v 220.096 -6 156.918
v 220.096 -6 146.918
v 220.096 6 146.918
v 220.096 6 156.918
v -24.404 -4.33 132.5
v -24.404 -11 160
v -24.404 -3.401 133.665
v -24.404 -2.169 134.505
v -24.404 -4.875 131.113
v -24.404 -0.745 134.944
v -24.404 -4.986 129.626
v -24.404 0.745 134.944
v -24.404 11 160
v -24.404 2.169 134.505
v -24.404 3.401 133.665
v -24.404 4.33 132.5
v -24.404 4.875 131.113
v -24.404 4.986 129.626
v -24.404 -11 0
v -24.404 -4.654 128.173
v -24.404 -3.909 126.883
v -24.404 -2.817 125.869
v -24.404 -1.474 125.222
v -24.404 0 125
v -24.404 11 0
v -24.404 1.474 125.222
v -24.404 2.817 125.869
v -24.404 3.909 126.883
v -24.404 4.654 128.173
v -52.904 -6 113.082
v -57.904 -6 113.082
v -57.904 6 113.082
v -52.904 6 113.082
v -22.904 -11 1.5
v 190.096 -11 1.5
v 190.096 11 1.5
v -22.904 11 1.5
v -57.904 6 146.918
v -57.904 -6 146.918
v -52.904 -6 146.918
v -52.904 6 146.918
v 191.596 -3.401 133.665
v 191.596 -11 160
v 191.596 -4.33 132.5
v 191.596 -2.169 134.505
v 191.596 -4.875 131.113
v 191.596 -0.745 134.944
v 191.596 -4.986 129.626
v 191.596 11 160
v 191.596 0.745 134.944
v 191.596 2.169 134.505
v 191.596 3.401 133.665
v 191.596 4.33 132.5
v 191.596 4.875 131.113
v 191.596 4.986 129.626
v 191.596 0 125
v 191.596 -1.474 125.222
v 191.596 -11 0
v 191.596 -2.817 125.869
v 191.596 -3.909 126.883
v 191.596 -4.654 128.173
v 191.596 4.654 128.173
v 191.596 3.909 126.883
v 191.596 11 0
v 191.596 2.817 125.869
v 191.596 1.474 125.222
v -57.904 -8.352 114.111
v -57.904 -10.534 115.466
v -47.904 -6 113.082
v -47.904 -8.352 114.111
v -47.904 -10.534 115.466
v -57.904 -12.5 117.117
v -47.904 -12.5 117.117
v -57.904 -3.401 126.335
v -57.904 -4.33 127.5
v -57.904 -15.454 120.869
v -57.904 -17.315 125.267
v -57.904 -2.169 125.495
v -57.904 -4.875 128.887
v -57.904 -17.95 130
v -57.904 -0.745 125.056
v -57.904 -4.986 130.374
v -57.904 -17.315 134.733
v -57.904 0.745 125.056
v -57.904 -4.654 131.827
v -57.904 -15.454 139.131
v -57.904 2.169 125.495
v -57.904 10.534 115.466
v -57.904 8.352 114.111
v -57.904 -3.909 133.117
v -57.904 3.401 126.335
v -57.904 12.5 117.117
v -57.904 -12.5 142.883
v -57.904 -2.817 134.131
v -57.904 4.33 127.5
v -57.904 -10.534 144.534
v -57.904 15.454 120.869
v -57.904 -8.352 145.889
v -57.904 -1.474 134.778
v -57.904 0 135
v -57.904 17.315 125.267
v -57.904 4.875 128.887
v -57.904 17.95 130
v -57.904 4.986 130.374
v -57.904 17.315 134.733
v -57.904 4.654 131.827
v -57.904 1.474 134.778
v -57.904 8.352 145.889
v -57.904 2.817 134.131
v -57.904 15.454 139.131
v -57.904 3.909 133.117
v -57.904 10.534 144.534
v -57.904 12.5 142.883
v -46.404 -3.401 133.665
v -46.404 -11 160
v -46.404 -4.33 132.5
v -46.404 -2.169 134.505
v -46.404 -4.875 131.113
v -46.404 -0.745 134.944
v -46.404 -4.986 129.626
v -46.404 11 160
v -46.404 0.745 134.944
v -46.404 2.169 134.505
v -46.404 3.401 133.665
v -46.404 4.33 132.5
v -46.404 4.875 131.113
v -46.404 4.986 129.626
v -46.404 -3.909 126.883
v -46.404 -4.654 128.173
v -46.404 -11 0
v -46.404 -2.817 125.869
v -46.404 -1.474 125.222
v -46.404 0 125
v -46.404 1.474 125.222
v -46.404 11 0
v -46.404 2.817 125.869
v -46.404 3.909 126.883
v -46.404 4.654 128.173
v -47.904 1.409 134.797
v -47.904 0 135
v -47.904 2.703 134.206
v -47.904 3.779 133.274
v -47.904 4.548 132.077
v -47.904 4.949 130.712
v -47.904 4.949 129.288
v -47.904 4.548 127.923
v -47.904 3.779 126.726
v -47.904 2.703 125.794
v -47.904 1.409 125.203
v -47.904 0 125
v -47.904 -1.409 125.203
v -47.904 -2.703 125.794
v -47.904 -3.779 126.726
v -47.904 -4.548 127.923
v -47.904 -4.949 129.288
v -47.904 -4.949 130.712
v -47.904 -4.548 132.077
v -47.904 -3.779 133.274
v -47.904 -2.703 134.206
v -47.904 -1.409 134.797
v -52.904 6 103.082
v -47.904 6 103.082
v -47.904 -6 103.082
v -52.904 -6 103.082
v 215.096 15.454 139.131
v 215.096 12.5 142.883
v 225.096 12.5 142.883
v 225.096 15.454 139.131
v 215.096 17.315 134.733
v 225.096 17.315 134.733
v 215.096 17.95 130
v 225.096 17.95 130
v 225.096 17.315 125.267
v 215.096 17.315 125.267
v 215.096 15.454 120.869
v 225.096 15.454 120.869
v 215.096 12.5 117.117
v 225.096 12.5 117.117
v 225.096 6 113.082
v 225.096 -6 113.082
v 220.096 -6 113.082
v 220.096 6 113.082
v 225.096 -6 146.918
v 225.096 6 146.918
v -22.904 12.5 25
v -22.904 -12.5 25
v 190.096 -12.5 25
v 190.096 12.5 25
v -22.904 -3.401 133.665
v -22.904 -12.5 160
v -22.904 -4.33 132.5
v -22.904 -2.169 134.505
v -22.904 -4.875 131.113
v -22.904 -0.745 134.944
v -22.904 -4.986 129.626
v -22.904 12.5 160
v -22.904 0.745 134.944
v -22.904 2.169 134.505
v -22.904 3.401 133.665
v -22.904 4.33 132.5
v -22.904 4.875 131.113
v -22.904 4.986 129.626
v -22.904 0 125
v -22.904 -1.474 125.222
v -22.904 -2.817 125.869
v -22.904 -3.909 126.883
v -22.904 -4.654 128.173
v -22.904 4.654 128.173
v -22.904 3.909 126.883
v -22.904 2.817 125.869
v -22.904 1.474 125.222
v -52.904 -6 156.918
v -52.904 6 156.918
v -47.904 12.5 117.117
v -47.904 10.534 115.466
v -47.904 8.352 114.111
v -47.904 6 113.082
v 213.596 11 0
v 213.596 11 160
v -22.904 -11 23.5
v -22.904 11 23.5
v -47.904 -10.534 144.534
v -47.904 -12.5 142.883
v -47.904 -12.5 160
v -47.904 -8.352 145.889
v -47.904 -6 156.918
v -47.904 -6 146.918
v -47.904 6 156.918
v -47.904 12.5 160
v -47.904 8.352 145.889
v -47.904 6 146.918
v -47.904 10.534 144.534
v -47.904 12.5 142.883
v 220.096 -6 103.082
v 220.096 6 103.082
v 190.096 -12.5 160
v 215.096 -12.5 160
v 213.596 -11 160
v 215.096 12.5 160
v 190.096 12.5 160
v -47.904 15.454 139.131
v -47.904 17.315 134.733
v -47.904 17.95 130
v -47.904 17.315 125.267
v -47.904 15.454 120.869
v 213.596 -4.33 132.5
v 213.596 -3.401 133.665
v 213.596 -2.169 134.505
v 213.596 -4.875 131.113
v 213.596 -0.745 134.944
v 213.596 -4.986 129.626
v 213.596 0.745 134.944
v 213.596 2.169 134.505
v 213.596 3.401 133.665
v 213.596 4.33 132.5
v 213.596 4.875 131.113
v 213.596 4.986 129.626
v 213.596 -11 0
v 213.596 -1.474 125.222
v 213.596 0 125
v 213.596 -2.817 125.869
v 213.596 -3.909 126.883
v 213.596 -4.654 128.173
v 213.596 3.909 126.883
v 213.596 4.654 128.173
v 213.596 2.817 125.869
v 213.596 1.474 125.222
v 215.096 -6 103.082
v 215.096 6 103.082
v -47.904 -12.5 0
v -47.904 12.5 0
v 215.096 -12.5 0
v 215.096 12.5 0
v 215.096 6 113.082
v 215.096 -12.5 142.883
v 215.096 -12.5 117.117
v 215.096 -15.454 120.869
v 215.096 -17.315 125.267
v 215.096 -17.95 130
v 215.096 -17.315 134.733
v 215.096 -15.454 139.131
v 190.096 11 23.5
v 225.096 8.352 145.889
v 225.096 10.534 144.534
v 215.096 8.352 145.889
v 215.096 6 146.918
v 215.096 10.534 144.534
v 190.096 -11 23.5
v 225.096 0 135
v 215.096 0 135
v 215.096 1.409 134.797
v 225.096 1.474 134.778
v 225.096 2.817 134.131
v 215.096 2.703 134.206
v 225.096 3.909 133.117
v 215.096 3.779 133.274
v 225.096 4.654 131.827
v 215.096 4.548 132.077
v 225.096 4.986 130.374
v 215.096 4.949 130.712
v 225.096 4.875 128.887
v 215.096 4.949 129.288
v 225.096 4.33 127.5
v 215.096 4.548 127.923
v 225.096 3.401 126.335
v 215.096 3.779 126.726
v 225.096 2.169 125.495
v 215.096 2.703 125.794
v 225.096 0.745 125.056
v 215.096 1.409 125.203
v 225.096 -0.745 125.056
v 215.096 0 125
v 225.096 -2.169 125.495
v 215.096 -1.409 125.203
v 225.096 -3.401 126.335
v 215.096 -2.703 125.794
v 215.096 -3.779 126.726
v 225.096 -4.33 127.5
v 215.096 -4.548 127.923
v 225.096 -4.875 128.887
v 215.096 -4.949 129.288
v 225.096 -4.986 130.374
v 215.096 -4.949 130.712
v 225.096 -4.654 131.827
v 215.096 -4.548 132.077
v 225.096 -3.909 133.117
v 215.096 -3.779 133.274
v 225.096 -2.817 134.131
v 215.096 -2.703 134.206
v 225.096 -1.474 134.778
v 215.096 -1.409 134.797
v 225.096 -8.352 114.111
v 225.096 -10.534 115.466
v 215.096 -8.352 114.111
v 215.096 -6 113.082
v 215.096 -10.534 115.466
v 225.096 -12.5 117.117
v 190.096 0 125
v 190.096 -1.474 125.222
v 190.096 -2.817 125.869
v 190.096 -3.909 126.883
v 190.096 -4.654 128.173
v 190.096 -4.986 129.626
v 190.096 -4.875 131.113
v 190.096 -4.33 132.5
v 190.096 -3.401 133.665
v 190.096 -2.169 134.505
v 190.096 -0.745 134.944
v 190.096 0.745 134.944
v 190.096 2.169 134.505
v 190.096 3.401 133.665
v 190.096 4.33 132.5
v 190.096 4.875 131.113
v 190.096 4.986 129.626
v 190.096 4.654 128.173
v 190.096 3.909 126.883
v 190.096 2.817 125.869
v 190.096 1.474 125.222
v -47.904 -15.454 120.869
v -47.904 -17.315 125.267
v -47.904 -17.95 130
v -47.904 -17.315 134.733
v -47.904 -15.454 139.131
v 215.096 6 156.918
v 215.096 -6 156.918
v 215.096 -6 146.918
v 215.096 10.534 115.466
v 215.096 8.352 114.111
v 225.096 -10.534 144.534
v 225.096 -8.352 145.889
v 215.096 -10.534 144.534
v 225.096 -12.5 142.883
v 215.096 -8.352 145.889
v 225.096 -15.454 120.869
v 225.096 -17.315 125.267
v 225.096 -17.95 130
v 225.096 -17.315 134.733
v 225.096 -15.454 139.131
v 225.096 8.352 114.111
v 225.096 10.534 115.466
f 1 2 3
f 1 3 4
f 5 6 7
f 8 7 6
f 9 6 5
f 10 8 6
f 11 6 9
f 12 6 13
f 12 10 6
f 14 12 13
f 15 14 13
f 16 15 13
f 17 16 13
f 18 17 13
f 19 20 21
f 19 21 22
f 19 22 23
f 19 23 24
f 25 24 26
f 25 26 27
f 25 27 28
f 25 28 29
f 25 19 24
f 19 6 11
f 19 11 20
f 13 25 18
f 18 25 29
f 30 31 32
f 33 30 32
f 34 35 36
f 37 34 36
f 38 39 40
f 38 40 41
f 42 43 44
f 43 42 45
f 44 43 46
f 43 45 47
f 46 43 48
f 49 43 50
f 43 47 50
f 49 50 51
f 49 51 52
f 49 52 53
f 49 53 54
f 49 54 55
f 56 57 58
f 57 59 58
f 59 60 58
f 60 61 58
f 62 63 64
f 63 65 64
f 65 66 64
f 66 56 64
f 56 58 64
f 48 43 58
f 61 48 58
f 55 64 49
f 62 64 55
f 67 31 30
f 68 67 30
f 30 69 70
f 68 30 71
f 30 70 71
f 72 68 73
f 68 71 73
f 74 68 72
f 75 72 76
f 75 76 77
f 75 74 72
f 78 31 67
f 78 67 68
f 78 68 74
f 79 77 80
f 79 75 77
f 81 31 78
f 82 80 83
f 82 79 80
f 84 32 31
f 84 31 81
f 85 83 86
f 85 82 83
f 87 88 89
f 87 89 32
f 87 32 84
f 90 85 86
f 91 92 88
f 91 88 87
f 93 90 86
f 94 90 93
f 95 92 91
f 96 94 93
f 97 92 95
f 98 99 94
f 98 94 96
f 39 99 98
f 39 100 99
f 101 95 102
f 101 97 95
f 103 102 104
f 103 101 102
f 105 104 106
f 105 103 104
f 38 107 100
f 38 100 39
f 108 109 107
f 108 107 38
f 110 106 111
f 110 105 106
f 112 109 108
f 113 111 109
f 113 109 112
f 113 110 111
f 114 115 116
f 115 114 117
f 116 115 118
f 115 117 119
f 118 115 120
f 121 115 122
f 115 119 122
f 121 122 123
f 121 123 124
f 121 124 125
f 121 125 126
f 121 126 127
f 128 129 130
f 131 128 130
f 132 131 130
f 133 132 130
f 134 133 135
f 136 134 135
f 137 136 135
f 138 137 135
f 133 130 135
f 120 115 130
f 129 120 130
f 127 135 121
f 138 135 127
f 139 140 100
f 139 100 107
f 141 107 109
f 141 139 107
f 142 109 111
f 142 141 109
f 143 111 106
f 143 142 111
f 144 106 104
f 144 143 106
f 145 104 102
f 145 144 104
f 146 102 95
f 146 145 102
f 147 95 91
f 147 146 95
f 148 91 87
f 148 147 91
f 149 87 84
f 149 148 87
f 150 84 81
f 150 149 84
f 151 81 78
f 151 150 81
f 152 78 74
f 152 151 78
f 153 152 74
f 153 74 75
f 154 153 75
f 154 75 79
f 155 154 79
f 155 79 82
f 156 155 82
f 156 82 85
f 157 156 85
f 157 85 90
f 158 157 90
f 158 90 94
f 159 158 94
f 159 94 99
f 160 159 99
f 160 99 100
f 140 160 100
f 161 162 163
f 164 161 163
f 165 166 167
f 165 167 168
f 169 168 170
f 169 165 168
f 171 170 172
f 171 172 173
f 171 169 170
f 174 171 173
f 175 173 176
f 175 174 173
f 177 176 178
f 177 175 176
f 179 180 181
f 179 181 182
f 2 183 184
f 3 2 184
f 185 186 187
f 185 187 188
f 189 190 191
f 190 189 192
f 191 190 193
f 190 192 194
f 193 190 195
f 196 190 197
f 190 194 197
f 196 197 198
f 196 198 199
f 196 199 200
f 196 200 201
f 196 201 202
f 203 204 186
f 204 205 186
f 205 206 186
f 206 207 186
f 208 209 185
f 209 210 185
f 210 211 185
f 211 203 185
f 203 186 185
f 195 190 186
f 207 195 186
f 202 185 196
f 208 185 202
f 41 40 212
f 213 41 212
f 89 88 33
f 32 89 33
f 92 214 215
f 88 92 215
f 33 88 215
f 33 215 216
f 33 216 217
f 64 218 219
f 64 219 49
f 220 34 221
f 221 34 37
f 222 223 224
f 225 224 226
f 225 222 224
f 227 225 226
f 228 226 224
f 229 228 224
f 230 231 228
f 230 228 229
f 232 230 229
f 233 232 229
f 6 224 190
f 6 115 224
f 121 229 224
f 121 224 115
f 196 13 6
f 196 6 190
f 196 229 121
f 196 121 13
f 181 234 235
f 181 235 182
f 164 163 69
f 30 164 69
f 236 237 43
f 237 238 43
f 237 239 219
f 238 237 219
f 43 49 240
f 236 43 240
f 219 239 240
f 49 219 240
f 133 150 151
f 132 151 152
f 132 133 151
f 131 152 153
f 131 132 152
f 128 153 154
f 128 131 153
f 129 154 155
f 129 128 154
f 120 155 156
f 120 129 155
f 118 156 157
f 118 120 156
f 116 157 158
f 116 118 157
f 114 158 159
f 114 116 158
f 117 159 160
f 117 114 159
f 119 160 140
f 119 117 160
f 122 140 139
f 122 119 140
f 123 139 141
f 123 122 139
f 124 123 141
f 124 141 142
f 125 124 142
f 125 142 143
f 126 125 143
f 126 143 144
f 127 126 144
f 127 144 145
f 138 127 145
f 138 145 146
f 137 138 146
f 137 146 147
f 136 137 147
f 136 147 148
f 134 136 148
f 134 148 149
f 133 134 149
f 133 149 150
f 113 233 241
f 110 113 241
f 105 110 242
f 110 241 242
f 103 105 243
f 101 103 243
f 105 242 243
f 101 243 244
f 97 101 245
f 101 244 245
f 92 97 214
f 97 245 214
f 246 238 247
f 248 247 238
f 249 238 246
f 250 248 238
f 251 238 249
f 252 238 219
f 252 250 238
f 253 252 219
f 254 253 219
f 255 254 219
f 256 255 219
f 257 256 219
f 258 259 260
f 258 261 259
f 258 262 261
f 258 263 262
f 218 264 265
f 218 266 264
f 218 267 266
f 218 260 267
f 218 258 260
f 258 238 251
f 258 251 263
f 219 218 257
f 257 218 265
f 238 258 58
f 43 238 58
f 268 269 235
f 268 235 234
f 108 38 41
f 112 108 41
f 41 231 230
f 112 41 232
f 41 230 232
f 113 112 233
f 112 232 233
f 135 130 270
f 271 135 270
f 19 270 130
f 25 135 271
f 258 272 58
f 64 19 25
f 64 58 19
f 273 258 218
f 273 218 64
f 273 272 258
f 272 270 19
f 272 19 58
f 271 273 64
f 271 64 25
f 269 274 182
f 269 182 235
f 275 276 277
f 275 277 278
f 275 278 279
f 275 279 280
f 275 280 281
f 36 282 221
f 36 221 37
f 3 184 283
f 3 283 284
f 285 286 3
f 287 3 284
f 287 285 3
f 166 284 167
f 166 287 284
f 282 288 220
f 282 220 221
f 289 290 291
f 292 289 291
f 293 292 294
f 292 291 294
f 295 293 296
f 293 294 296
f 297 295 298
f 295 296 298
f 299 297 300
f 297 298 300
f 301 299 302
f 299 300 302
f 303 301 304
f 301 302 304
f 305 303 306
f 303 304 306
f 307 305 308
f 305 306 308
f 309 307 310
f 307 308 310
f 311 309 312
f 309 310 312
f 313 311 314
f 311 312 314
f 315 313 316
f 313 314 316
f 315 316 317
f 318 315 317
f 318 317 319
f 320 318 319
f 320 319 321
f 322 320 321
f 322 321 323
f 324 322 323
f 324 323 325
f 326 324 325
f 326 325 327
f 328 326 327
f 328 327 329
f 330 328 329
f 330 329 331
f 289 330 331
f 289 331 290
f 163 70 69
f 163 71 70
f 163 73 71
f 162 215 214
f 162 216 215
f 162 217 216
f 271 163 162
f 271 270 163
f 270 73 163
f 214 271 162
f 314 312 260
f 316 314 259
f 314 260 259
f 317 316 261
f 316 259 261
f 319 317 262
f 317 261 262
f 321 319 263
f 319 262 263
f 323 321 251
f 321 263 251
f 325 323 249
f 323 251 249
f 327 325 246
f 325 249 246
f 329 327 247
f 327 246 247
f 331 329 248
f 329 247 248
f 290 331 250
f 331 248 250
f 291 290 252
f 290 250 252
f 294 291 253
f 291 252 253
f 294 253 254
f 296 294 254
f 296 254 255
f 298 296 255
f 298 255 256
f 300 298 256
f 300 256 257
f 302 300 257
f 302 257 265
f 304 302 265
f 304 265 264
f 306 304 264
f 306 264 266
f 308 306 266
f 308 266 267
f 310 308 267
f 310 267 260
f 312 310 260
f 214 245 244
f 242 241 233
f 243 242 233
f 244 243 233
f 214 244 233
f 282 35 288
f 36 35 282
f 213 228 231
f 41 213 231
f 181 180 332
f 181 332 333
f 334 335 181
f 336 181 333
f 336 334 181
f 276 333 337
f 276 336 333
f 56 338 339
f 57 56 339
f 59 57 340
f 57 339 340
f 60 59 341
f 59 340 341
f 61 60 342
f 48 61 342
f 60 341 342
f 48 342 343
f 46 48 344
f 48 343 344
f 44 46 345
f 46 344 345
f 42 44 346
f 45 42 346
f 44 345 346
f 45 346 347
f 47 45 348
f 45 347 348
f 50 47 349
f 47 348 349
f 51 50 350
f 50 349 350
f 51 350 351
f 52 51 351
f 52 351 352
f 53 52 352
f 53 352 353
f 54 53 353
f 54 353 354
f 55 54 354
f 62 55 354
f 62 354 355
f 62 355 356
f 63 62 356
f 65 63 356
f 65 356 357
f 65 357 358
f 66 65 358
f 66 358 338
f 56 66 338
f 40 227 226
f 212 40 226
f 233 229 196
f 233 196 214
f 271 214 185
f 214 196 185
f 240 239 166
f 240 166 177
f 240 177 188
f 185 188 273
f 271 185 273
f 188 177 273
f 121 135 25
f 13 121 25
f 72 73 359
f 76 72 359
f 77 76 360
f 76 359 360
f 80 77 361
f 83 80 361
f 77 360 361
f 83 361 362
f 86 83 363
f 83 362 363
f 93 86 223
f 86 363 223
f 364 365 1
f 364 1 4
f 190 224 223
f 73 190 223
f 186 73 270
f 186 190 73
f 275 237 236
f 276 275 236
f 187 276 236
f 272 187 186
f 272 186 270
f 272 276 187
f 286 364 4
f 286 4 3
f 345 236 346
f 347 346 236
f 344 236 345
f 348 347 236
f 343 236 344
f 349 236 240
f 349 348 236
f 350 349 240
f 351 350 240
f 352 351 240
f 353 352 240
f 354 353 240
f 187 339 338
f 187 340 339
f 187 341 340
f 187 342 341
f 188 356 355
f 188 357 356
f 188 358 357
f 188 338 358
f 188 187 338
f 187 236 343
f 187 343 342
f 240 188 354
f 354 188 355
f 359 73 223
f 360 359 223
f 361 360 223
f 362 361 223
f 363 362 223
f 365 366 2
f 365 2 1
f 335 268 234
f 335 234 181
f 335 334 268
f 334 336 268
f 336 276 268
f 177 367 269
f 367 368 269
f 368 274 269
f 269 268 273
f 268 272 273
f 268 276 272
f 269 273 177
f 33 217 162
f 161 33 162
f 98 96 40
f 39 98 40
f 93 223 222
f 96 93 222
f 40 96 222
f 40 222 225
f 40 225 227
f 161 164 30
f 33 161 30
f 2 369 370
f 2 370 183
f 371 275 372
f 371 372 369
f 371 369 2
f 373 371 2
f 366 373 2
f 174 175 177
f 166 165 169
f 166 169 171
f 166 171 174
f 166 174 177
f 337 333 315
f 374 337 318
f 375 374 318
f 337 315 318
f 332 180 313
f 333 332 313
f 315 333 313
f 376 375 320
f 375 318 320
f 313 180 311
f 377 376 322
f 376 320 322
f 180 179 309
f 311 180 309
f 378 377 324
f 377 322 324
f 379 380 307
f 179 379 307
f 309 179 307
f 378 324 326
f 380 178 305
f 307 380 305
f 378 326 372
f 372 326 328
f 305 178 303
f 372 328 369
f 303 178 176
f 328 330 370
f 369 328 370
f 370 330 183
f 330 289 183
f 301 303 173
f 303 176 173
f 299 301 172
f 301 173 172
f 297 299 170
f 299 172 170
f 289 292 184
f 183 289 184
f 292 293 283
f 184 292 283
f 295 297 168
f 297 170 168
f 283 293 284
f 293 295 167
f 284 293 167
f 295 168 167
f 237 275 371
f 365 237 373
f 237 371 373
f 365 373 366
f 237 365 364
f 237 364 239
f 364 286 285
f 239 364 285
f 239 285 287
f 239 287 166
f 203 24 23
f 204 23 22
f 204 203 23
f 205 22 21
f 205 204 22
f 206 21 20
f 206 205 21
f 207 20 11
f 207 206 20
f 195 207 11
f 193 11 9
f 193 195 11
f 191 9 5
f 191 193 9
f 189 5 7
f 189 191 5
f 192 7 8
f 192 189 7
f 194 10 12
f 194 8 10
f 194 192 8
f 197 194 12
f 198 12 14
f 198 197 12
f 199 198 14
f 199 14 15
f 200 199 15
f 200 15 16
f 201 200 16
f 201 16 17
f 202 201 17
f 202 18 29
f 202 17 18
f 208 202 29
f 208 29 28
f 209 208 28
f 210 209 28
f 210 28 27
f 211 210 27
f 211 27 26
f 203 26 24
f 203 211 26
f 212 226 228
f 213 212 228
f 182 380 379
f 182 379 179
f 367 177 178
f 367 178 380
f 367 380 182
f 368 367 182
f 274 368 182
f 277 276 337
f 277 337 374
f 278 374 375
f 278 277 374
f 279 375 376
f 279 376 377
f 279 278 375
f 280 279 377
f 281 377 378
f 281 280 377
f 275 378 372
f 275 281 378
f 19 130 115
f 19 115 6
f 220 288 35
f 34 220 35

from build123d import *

# Parameters (mm, degrees)
SKETCH3_W           = 25
SKETCH3_H           = 25
SKETCH3_W_2         = 22
SKETCH3_H_2         = 22
BOSS_EXTRUDE1_DEPTH = 160
SKETCH4_W           = 25
SKETCH4_H           = 25
SKETCH4_W_2         = 22
SKETCH4_H_2         = 22
BOSS_EXTRUDE2_DEPTH = 106.5
SKETCH5_R           = 5
BOSS_EXTRUDE3_DEPTH = 10
SKETCH6_W           = 10
SKETCH6_H           = 12
CUT_EXTRUDE1_DEPTH  = 5
CUT_EXTRUDE2_START  = -25
SKETCH7_R           = 5
CUT_EXTRUDE2_DEPTH  = 25


with BuildPart() as part:
    # Sketch3 → Boss-Extrude1 (new body)
    with BuildSketch(Plane.XY):
        with Locations((-35.404260395, 0)):
            Rectangle(SKETCH3_W, SKETCH3_H)
        with Locations((-35.404260395, 0)):
            Rectangle(SKETCH3_W_2, SKETCH3_H_2, mode=Mode.SUBTRACT)
    boss_extrude1 = extrude(amount=BOSS_EXTRUDE1_DEPTH)

    # Sketch4 → Boss-Extrude2 (add)
    with BuildSketch(Plane(origin=(-22.904260395, 0, 0), x_dir=(0, 0, -1), z_dir=(1, 0, 0))):
        with Locations((-12.5, 0)):
            Rectangle(SKETCH4_W, SKETCH4_H)
        with Locations((-12.5, 0)):
            Rectangle(SKETCH4_W_2, SKETCH4_H_2, mode=Mode.SUBTRACT)
    boss_extrude2 = extrude(amount=BOSS_EXTRUDE2_DEPTH)

    # Sketch5 → Boss-Extrude3 (add)
    # profile 1 of 5: a face of its own
    with BuildSketch(Plane.ZY.offset(47.904260395)):
        with BuildLine():
            ThreePointArc((113.082291583, -6), (112.049822896, 0), (113.082291583, 6))
            Line((113.082291583, 6), (103.082291583, 6))
            Line((103.082291583, 6), (103.082291583, -6))
            Line((103.082291583, -6), (113.082291583, -6))
        make_face()
    # profile 2 of 5: a face of its own
    with BuildSketch(Plane.ZY.offset(47.904260395)):
        with BuildLine():
            ThreePointArc((147.950177104, 0), (147.69017694, 3.044092295), (146.917708417, 6))
            ThreePointArc((146.917708417, 6), (145.250430663, 9.467482384), (142.882502012, 12.5))
            Line((142.882502012, 12.5), (117.117497988, 12.5))
            ThreePointArc((117.117497988, 12.5), (114.749569337, 9.467482384), (113.082291583, 6))
            ThreePointArc((113.082291583, 6), (112.049822896, 0), (113.082291583, -6))
            ThreePointArc((113.082291583, -6), (114.749569337, -9.467482384), (117.117497988, -12.5))
            Line((117.117497988, -12.5), (142.882502012, -12.5))
            ThreePointArc((142.882502012, -12.5), (145.250430663, -9.467482384), (146.917708417, -6))
            ThreePointArc((146.917708417, -6), (147.69017694, -3.044092295), (147.950177104, 0))
        make_face()
        with Locations((130, 0)):
            Circle(SKETCH5_R, mode=Mode.SUBTRACT)
    # profile 3 of 5: a face of its own
    with BuildSketch(Plane.ZY.offset(47.904260395)):
        with BuildLine():
            Line((156.917708417, 6), (146.917708417, 6))
            ThreePointArc((146.917708417, 6), (147.69017694, 3.044092295), (147.950177104, 0))
            ThreePointArc((147.950177104, 0), (147.69017694, -3.044092295), (146.917708417, -6))
            Line((146.917708417, -6), (156.917708417, -6))
            Line((156.917708417, -6), (156.917708417, 6))
        make_face()
    # profile 4 of 5: a face of its own
    with BuildSketch(Plane.ZY.offset(47.904260395)):
        with BuildLine():
            Line((117.117497988, 12.5), (142.882502012, 12.5))
            ThreePointArc((142.882502012, 12.5), (130, 17.950177104), (117.117497988, 12.5))
        make_face()
    # profile 5 of 5: a face of its own
    with BuildSketch(Plane.ZY.offset(47.904260395)):
        with BuildLine():
            ThreePointArc((117.117497988, -12.5), (130, -17.950177104), (142.882502012, -12.5))
            Line((142.882502012, -12.5), (117.117497988, -12.5))
        make_face()
    boss_extrude3 = extrude(amount=BOSS_EXTRUDE3_DEPTH)

    # Sketch6 → Cut-Extrude1 (cut)
    with BuildSketch(Plane.ZY.offset(57.904260395)):
        with Locations((108.082291583, 0)):
            Rectangle(SKETCH6_W, SKETCH6_H)
        with Locations((151.917708417, 0)):
            Rectangle(SKETCH6_W, SKETCH6_H)
    cut_extrude1 = extrude(amount=-CUT_EXTRUDE1_DEPTH, mode=Mode.SUBTRACT)

    # Sketch7 → Cut-Extrude2 (cut)
    with BuildSketch(Plane.ZY.offset(47.904260395).offset(CUT_EXTRUDE2_START)):
        with Locations(Location((130, 0, 0), (0, 0, 180))):
            Circle(SKETCH7_R)
    cut_extrude2 = extrude(amount=CUT_EXTRUDE2_DEPTH, mode=Mode.SUBTRACT)

    # Mirror1: Boss-Extrude1, Boss-Extrude2, Boss-Extrude3, Cut-Extrude1, Cut-Extrude2 across plane
    add(boss_extrude1.mirror(Plane(origin=(83.595739605, 0, 0), x_dir=(0, 0, 1), z_dir=(1, 0, 0))))
    add(boss_extrude2.mirror(Plane(origin=(83.595739605, 0, 0), x_dir=(0, 0, 1), z_dir=(1, 0, 0))))
    add(boss_extrude3.mirror(Plane(origin=(83.595739605, 0, 0), x_dir=(0, 0, 1), z_dir=(1, 0, 0))))
    add(cut_extrude1.mirror(Plane(origin=(83.595739605, 0, 0), x_dir=(0, 0, 1), z_dir=(1, 0, 0))), mode=Mode.SUBTRACT)
    add(cut_extrude2.mirror(Plane(origin=(83.595739605, 0, 0), x_dir=(0, 0, 1), z_dir=(1, 0, 0))), mode=Mode.SUBTRACT)


solid = part.part
